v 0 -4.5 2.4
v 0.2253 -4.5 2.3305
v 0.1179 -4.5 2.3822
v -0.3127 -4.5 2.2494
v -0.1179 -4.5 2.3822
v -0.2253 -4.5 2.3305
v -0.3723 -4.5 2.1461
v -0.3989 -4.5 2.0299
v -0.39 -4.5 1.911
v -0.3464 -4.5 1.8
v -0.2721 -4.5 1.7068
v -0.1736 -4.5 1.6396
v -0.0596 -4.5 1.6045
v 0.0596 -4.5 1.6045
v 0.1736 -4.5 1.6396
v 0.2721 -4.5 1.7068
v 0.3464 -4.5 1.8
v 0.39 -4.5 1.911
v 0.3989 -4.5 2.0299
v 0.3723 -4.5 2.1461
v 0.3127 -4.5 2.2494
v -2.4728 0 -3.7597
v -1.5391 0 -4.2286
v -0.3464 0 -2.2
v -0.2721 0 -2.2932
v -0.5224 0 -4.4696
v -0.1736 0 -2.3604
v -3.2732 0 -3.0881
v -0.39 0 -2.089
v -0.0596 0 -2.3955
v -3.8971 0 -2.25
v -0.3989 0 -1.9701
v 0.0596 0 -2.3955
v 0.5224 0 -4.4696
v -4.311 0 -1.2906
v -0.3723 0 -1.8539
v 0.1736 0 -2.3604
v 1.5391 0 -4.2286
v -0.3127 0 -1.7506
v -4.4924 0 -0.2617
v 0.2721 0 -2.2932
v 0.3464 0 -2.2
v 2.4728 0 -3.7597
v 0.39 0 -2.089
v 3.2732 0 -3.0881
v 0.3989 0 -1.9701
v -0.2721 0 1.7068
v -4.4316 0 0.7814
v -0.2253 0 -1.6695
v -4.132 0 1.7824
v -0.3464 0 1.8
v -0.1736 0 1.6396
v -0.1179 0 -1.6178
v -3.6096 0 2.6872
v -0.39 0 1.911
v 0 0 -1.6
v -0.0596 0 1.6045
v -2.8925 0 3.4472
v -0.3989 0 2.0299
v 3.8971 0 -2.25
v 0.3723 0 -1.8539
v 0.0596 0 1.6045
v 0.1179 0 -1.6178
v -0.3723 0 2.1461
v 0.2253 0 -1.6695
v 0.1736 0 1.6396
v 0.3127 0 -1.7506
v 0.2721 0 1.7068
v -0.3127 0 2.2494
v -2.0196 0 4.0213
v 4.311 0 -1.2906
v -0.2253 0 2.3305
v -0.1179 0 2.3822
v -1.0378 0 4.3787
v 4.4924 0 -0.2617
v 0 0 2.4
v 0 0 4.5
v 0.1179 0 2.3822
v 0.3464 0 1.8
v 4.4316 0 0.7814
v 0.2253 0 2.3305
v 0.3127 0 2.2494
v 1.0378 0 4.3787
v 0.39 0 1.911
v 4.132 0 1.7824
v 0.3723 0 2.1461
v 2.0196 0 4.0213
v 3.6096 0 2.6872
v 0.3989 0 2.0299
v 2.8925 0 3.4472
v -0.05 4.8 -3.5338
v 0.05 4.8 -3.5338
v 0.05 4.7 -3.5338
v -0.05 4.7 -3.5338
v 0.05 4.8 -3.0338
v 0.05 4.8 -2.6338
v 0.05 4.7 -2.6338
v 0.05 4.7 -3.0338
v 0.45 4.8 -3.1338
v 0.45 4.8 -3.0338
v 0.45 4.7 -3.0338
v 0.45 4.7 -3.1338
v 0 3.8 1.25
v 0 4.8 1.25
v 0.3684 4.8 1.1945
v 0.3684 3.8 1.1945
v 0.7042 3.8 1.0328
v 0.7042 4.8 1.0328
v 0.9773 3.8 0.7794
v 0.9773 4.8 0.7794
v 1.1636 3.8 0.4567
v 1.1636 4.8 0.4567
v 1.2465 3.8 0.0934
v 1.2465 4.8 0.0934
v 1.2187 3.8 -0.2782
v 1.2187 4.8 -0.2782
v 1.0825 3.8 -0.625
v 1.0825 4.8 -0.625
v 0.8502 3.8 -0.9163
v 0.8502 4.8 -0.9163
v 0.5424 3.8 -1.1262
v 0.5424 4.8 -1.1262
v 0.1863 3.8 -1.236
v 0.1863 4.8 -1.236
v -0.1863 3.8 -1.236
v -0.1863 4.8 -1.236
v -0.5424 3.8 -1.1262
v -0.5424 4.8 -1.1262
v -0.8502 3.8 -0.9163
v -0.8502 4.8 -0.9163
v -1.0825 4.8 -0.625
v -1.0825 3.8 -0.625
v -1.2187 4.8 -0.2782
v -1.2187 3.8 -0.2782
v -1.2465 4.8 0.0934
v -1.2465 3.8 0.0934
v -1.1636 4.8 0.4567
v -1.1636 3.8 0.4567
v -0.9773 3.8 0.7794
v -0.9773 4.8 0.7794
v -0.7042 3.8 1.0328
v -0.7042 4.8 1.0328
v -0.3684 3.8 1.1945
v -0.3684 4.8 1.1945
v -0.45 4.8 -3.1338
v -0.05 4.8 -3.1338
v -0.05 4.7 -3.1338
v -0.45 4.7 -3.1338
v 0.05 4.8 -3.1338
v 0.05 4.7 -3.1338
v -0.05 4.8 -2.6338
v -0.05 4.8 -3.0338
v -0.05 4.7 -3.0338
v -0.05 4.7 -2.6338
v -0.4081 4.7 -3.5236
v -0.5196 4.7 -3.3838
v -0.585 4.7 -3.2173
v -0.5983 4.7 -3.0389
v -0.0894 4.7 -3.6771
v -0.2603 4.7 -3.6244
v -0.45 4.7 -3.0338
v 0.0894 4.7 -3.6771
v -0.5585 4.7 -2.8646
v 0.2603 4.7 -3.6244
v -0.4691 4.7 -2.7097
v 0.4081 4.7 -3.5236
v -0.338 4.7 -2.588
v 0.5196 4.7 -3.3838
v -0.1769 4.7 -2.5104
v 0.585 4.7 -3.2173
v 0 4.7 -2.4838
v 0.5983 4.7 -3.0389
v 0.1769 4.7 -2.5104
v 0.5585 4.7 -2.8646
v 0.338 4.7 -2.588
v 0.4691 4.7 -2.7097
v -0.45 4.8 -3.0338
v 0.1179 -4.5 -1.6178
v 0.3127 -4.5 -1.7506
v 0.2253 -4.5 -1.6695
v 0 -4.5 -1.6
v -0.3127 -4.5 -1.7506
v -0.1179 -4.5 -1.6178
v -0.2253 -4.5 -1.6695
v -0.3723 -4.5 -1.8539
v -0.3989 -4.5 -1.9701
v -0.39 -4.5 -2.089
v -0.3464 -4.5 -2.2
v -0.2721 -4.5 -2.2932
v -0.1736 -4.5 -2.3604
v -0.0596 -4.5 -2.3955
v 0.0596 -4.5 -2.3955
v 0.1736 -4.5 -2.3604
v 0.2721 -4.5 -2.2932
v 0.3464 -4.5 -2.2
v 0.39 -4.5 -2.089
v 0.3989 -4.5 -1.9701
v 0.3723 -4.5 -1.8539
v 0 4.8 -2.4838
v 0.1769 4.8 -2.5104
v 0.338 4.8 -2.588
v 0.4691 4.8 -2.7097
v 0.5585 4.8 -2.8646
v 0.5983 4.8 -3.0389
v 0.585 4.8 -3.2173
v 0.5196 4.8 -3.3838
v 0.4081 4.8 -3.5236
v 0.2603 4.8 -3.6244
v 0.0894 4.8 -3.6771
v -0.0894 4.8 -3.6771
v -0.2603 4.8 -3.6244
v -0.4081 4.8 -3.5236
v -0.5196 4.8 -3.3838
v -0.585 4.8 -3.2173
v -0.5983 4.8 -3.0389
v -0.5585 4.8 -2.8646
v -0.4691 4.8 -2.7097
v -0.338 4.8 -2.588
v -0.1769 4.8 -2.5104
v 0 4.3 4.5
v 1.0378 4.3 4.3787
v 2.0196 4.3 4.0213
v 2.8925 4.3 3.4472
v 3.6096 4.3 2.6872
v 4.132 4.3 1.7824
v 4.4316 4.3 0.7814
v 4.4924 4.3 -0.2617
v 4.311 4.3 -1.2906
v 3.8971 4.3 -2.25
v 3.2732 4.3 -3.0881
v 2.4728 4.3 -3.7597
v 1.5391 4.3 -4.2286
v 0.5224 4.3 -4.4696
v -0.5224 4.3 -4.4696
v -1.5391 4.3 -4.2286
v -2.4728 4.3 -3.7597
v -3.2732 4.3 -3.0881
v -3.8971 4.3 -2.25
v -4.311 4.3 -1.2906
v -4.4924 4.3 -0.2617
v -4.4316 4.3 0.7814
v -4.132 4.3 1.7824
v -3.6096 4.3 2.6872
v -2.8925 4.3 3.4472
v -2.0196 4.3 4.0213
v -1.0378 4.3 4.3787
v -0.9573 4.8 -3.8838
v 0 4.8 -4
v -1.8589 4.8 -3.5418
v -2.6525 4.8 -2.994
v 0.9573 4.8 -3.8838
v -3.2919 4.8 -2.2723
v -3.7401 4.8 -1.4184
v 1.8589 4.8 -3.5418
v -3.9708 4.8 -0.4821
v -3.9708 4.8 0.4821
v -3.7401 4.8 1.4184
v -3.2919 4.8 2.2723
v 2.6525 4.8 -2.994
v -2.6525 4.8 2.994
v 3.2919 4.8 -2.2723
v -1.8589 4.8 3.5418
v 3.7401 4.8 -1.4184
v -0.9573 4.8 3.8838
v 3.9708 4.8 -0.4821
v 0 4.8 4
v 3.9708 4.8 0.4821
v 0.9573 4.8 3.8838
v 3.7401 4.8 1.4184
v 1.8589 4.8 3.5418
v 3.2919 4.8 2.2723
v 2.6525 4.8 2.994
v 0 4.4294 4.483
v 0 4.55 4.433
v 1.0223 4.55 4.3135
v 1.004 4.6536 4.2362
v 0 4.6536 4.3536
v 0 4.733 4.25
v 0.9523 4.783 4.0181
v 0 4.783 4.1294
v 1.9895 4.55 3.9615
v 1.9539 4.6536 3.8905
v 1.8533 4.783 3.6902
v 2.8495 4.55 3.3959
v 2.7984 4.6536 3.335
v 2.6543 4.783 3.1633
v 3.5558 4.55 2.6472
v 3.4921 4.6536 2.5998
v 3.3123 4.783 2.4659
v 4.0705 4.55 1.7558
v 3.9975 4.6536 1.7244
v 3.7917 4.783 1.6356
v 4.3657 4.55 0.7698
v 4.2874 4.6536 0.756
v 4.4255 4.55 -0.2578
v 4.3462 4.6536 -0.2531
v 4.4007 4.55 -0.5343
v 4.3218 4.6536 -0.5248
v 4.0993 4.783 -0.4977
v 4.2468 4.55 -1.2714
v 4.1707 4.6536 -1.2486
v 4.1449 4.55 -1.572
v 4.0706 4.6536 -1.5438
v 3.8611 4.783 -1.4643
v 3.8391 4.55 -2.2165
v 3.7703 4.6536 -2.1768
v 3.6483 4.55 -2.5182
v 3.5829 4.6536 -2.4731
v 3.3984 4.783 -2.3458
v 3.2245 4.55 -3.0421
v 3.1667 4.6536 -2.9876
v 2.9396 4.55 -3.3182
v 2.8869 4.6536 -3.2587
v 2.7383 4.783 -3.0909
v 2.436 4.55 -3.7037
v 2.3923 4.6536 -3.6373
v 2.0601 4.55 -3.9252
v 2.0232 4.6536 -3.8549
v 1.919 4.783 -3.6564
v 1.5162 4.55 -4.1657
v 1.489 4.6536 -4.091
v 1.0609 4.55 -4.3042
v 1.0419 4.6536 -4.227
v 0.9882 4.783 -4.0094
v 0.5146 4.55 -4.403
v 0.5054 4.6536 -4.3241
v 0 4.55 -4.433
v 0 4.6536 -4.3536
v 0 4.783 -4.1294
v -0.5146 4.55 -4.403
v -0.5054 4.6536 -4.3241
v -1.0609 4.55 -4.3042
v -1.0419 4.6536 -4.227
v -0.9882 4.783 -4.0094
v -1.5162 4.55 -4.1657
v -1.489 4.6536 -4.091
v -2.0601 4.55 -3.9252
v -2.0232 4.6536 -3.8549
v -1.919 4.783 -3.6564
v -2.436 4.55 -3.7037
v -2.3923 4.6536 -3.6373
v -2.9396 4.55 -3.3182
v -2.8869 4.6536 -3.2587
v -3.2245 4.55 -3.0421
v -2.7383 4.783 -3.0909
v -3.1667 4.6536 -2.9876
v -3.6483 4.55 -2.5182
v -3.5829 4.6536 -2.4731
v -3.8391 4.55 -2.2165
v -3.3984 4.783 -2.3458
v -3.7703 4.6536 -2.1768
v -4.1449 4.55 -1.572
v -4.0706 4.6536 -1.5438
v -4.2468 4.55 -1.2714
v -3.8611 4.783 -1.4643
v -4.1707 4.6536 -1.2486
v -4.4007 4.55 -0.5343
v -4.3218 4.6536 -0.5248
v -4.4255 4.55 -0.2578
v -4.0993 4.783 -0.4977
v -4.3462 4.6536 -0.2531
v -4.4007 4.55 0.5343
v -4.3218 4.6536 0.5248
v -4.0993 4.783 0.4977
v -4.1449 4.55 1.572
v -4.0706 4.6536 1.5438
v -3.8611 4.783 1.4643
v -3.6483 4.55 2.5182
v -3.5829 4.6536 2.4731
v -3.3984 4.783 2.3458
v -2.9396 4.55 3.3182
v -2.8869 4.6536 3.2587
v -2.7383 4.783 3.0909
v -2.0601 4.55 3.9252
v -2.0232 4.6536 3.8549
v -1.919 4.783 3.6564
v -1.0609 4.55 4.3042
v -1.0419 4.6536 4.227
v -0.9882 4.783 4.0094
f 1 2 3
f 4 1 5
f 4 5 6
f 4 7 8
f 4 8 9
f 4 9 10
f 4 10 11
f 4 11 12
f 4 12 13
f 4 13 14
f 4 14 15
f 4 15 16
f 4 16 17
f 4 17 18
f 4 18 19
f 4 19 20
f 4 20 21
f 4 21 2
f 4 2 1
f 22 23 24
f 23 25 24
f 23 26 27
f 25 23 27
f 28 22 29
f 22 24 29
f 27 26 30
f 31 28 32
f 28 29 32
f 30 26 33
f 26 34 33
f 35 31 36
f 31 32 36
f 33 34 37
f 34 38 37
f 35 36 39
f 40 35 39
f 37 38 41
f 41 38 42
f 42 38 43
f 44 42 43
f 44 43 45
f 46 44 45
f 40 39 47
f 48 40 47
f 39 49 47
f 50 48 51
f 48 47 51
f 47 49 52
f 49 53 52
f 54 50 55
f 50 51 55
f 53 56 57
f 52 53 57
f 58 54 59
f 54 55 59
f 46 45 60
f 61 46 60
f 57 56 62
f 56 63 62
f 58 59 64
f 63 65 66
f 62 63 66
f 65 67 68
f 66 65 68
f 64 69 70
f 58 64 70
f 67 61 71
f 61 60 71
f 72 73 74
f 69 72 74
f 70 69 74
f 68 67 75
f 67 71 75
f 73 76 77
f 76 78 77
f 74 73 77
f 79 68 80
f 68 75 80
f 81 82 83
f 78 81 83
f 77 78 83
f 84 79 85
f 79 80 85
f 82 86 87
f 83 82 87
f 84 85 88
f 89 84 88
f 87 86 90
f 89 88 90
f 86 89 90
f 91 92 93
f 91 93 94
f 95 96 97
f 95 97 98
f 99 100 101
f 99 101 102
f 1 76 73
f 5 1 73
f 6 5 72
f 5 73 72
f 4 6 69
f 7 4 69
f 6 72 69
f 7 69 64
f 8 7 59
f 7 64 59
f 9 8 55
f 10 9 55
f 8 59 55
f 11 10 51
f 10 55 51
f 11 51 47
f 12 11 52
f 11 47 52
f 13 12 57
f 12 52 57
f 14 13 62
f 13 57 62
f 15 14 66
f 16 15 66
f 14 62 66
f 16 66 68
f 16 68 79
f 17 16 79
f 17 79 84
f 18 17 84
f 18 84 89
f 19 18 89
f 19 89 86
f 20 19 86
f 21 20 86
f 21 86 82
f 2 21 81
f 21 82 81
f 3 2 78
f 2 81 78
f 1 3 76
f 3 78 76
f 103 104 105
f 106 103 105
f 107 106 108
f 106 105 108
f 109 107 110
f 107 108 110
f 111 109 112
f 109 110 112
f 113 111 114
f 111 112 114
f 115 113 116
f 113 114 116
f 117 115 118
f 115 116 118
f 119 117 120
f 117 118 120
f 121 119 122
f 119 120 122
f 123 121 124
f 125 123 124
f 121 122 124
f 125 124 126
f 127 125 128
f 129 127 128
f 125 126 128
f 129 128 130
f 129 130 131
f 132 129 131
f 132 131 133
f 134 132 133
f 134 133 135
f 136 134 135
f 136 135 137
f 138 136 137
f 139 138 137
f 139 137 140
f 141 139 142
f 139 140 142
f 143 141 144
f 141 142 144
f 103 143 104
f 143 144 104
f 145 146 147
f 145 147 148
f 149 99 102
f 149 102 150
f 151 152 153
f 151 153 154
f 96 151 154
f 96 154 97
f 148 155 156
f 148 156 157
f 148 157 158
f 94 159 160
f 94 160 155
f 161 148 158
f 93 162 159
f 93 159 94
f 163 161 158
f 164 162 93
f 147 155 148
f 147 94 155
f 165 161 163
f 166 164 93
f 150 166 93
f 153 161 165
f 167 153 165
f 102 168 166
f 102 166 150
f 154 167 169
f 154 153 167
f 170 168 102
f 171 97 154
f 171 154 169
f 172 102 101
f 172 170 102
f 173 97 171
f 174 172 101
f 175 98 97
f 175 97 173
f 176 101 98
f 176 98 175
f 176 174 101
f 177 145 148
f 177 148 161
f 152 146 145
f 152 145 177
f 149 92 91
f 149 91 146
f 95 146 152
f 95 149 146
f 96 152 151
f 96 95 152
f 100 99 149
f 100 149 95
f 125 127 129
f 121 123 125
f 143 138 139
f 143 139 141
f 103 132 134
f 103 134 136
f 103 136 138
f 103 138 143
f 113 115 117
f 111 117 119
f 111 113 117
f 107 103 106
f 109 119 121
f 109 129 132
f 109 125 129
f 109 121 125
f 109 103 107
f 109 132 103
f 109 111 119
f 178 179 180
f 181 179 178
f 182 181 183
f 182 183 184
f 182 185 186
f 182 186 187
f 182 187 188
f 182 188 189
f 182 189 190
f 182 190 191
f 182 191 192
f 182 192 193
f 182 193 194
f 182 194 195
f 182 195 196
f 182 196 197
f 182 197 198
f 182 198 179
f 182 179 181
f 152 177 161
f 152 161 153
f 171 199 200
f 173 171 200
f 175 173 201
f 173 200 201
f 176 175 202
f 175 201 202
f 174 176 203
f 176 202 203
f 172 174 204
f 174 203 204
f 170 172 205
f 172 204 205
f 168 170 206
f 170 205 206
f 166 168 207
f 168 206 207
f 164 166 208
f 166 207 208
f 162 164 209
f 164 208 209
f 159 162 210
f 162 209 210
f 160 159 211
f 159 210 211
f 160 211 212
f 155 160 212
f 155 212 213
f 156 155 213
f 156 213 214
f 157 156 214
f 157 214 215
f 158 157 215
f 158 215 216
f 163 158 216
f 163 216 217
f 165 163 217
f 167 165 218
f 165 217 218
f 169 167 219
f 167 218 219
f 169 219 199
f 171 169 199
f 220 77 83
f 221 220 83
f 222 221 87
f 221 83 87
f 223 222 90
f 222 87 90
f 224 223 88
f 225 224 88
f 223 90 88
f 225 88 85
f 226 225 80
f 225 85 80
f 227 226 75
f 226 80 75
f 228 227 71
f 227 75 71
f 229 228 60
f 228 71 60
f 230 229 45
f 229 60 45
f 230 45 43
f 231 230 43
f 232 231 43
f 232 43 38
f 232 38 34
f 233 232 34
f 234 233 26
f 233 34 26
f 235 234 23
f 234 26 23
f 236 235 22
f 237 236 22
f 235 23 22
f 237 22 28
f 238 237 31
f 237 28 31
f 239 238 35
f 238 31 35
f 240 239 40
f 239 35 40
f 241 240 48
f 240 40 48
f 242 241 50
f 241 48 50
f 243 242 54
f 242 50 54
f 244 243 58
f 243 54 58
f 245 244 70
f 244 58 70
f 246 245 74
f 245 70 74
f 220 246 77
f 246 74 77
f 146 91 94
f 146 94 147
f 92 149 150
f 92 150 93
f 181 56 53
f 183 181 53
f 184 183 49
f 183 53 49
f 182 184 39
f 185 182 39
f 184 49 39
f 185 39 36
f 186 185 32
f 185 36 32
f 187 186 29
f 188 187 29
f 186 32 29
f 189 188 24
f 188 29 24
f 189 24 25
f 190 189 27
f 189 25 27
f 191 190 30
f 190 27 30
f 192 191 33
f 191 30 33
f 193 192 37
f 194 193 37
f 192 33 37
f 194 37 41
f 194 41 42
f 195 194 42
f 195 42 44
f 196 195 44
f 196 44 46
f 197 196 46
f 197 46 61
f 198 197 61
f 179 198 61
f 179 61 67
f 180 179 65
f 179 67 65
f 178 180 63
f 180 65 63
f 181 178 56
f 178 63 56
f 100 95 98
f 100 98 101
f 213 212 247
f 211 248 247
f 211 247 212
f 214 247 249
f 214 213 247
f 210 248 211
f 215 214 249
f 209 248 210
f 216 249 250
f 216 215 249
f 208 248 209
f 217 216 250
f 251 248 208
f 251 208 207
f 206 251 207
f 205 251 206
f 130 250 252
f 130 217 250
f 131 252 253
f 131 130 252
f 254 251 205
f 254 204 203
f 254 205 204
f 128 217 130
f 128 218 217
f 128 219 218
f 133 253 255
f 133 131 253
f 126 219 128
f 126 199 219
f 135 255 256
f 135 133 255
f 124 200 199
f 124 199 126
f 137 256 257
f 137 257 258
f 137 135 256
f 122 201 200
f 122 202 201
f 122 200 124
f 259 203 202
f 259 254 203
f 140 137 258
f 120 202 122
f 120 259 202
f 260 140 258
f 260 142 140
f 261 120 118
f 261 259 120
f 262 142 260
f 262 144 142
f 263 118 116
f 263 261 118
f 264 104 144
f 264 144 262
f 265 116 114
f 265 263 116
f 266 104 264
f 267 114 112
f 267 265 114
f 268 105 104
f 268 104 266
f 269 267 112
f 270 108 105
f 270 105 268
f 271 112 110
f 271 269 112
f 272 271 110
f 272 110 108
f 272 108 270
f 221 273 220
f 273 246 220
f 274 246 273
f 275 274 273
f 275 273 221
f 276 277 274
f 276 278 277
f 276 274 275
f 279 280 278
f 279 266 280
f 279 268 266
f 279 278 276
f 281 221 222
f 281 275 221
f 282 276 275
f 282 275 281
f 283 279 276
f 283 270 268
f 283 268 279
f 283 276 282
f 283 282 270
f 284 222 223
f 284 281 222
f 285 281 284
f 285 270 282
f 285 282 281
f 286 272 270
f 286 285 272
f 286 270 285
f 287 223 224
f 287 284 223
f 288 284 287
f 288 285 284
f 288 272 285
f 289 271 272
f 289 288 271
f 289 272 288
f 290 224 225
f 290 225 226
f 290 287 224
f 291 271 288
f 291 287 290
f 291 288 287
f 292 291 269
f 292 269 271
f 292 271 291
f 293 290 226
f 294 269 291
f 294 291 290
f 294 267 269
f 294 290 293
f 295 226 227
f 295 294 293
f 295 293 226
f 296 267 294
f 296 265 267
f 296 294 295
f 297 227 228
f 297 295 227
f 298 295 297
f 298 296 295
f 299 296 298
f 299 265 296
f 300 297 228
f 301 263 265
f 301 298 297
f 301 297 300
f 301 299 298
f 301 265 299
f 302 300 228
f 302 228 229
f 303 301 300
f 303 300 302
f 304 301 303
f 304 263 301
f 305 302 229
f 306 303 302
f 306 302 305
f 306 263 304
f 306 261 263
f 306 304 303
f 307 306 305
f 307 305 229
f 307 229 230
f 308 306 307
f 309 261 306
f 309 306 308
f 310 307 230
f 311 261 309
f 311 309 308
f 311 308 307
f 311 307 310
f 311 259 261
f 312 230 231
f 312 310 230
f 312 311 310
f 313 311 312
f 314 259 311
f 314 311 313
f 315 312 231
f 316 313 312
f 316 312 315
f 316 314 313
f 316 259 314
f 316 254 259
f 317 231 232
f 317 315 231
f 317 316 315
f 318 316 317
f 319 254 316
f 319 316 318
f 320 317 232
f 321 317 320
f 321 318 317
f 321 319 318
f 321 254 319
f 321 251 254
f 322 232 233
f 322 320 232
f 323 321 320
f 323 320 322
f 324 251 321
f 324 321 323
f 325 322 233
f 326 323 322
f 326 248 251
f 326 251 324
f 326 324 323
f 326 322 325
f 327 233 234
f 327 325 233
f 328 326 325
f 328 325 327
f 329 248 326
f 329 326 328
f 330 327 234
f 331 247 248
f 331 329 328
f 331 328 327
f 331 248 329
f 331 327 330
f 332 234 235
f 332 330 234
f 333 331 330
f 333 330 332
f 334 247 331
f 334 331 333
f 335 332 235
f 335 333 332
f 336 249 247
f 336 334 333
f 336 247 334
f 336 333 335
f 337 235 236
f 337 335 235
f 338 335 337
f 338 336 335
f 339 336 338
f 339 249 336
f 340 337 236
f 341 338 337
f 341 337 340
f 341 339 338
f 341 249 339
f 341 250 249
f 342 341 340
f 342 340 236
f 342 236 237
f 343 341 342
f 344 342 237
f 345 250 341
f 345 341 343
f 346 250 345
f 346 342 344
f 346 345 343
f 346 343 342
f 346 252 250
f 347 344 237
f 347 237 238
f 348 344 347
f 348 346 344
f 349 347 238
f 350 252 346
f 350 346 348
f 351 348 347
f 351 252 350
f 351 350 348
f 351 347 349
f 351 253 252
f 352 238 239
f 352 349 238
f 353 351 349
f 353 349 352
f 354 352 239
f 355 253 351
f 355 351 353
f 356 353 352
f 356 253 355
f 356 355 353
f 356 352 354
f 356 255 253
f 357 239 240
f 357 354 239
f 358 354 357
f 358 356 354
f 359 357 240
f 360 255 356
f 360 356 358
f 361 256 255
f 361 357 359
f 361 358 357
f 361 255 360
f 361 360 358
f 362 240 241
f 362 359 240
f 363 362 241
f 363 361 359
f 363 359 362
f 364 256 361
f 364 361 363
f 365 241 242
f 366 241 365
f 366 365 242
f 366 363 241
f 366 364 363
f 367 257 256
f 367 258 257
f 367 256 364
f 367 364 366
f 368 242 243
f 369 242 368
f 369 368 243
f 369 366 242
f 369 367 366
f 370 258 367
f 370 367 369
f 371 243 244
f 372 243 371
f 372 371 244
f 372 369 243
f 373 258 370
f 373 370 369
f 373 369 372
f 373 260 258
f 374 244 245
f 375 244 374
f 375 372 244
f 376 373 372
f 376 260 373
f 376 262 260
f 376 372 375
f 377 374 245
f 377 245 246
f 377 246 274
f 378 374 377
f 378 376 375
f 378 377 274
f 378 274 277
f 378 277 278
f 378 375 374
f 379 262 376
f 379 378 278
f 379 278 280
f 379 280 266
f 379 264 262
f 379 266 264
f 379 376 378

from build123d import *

# Parameters (mm, degrees)
SKETCH1_R          = 4.5
EXTRUDE1_DEPTH     = 4.8
FILLET1_R          = 0.5
SKETCH6_R          = 0.4
EXTRUDE6_DEPTH     = 4.5
SKETCH2_R          = 1.25
CUT_EXTRUDE2_DEPTH = 1
SKETCH8_R          = 0.6
CUT_EXTRUDE3_DEPTH = 0.1


with BuildPart() as part:
    # Sketch1 → Extrude1 (new body)
    with BuildSketch(Plane(origin=(0, 0, 0), x_dir=(1, 0, 0), z_dir=(0, 1, 0))):
        with Locations(Location((0, 0, 0), (0, 0, 270))):
            Circle(SKETCH1_R)
    extrude(amount=EXTRUDE1_DEPTH)

    # Fillet1
    fillet1_edges = [part.edges().sort_by_distance(p)[0] for p in [
        (0, 4.8, -4.5),
    ]]
    fillet(fillet1_edges, radius=FILLET1_R)

    # Sketch6 → Extrude6 (add)
    with BuildSketch(Plane.XZ):
        with Locations(Location((0, -2, 0), (0, 0, 90))):
            Circle(SKETCH6_R)
        with Locations(Location((0, 2, 0), (0, 0, 90))):
            Circle(SKETCH6_R)
    extrude(amount=EXTRUDE6_DEPTH)

    # Sketch2 → Cut-Extrude2 (cut)
    with BuildSketch(Plane(origin=(0, 4.8, 0), x_dir=(1, 0, 0), z_dir=(0, 1, 0))):
        with Locations(Location((0, 0, 0), (0, 0, 270))):
            Circle(SKETCH2_R)
    extrude(amount=-CUT_EXTRUDE2_DEPTH, mode=Mode.SUBTRACT)

    # Sketch8 → Cut-Extrude3 (cut)
    with BuildSketch(Plane(origin=(0, 4.8, 0), x_dir=(1, 0, 0), z_dir=(0, 1, 0))):
        with Locations(Location((0, 3.083775569, 0), (0, 0, 270))):
            Circle(SKETCH8_R)
        Polygon((0.05, 3.533775569), (-0.05, 3.533775569), (-0.05, 3.133775569), (-0.45, 3.133775569), (-0.45, 3.033775569), (-0.05, 3.033775569), (-0.05, 2.633775569), (0.05, 2.633775569), (0.05, 3.033775569), (0.45, 3.033775569), (0.45, 3.133775569), (0.05, 3.133775569), align=None, mode=Mode.SUBTRACT)
    extrude(amount=-CUT_EXTRUDE3_DEPTH, mode=Mode.SUBTRACT)


solid = part.part
